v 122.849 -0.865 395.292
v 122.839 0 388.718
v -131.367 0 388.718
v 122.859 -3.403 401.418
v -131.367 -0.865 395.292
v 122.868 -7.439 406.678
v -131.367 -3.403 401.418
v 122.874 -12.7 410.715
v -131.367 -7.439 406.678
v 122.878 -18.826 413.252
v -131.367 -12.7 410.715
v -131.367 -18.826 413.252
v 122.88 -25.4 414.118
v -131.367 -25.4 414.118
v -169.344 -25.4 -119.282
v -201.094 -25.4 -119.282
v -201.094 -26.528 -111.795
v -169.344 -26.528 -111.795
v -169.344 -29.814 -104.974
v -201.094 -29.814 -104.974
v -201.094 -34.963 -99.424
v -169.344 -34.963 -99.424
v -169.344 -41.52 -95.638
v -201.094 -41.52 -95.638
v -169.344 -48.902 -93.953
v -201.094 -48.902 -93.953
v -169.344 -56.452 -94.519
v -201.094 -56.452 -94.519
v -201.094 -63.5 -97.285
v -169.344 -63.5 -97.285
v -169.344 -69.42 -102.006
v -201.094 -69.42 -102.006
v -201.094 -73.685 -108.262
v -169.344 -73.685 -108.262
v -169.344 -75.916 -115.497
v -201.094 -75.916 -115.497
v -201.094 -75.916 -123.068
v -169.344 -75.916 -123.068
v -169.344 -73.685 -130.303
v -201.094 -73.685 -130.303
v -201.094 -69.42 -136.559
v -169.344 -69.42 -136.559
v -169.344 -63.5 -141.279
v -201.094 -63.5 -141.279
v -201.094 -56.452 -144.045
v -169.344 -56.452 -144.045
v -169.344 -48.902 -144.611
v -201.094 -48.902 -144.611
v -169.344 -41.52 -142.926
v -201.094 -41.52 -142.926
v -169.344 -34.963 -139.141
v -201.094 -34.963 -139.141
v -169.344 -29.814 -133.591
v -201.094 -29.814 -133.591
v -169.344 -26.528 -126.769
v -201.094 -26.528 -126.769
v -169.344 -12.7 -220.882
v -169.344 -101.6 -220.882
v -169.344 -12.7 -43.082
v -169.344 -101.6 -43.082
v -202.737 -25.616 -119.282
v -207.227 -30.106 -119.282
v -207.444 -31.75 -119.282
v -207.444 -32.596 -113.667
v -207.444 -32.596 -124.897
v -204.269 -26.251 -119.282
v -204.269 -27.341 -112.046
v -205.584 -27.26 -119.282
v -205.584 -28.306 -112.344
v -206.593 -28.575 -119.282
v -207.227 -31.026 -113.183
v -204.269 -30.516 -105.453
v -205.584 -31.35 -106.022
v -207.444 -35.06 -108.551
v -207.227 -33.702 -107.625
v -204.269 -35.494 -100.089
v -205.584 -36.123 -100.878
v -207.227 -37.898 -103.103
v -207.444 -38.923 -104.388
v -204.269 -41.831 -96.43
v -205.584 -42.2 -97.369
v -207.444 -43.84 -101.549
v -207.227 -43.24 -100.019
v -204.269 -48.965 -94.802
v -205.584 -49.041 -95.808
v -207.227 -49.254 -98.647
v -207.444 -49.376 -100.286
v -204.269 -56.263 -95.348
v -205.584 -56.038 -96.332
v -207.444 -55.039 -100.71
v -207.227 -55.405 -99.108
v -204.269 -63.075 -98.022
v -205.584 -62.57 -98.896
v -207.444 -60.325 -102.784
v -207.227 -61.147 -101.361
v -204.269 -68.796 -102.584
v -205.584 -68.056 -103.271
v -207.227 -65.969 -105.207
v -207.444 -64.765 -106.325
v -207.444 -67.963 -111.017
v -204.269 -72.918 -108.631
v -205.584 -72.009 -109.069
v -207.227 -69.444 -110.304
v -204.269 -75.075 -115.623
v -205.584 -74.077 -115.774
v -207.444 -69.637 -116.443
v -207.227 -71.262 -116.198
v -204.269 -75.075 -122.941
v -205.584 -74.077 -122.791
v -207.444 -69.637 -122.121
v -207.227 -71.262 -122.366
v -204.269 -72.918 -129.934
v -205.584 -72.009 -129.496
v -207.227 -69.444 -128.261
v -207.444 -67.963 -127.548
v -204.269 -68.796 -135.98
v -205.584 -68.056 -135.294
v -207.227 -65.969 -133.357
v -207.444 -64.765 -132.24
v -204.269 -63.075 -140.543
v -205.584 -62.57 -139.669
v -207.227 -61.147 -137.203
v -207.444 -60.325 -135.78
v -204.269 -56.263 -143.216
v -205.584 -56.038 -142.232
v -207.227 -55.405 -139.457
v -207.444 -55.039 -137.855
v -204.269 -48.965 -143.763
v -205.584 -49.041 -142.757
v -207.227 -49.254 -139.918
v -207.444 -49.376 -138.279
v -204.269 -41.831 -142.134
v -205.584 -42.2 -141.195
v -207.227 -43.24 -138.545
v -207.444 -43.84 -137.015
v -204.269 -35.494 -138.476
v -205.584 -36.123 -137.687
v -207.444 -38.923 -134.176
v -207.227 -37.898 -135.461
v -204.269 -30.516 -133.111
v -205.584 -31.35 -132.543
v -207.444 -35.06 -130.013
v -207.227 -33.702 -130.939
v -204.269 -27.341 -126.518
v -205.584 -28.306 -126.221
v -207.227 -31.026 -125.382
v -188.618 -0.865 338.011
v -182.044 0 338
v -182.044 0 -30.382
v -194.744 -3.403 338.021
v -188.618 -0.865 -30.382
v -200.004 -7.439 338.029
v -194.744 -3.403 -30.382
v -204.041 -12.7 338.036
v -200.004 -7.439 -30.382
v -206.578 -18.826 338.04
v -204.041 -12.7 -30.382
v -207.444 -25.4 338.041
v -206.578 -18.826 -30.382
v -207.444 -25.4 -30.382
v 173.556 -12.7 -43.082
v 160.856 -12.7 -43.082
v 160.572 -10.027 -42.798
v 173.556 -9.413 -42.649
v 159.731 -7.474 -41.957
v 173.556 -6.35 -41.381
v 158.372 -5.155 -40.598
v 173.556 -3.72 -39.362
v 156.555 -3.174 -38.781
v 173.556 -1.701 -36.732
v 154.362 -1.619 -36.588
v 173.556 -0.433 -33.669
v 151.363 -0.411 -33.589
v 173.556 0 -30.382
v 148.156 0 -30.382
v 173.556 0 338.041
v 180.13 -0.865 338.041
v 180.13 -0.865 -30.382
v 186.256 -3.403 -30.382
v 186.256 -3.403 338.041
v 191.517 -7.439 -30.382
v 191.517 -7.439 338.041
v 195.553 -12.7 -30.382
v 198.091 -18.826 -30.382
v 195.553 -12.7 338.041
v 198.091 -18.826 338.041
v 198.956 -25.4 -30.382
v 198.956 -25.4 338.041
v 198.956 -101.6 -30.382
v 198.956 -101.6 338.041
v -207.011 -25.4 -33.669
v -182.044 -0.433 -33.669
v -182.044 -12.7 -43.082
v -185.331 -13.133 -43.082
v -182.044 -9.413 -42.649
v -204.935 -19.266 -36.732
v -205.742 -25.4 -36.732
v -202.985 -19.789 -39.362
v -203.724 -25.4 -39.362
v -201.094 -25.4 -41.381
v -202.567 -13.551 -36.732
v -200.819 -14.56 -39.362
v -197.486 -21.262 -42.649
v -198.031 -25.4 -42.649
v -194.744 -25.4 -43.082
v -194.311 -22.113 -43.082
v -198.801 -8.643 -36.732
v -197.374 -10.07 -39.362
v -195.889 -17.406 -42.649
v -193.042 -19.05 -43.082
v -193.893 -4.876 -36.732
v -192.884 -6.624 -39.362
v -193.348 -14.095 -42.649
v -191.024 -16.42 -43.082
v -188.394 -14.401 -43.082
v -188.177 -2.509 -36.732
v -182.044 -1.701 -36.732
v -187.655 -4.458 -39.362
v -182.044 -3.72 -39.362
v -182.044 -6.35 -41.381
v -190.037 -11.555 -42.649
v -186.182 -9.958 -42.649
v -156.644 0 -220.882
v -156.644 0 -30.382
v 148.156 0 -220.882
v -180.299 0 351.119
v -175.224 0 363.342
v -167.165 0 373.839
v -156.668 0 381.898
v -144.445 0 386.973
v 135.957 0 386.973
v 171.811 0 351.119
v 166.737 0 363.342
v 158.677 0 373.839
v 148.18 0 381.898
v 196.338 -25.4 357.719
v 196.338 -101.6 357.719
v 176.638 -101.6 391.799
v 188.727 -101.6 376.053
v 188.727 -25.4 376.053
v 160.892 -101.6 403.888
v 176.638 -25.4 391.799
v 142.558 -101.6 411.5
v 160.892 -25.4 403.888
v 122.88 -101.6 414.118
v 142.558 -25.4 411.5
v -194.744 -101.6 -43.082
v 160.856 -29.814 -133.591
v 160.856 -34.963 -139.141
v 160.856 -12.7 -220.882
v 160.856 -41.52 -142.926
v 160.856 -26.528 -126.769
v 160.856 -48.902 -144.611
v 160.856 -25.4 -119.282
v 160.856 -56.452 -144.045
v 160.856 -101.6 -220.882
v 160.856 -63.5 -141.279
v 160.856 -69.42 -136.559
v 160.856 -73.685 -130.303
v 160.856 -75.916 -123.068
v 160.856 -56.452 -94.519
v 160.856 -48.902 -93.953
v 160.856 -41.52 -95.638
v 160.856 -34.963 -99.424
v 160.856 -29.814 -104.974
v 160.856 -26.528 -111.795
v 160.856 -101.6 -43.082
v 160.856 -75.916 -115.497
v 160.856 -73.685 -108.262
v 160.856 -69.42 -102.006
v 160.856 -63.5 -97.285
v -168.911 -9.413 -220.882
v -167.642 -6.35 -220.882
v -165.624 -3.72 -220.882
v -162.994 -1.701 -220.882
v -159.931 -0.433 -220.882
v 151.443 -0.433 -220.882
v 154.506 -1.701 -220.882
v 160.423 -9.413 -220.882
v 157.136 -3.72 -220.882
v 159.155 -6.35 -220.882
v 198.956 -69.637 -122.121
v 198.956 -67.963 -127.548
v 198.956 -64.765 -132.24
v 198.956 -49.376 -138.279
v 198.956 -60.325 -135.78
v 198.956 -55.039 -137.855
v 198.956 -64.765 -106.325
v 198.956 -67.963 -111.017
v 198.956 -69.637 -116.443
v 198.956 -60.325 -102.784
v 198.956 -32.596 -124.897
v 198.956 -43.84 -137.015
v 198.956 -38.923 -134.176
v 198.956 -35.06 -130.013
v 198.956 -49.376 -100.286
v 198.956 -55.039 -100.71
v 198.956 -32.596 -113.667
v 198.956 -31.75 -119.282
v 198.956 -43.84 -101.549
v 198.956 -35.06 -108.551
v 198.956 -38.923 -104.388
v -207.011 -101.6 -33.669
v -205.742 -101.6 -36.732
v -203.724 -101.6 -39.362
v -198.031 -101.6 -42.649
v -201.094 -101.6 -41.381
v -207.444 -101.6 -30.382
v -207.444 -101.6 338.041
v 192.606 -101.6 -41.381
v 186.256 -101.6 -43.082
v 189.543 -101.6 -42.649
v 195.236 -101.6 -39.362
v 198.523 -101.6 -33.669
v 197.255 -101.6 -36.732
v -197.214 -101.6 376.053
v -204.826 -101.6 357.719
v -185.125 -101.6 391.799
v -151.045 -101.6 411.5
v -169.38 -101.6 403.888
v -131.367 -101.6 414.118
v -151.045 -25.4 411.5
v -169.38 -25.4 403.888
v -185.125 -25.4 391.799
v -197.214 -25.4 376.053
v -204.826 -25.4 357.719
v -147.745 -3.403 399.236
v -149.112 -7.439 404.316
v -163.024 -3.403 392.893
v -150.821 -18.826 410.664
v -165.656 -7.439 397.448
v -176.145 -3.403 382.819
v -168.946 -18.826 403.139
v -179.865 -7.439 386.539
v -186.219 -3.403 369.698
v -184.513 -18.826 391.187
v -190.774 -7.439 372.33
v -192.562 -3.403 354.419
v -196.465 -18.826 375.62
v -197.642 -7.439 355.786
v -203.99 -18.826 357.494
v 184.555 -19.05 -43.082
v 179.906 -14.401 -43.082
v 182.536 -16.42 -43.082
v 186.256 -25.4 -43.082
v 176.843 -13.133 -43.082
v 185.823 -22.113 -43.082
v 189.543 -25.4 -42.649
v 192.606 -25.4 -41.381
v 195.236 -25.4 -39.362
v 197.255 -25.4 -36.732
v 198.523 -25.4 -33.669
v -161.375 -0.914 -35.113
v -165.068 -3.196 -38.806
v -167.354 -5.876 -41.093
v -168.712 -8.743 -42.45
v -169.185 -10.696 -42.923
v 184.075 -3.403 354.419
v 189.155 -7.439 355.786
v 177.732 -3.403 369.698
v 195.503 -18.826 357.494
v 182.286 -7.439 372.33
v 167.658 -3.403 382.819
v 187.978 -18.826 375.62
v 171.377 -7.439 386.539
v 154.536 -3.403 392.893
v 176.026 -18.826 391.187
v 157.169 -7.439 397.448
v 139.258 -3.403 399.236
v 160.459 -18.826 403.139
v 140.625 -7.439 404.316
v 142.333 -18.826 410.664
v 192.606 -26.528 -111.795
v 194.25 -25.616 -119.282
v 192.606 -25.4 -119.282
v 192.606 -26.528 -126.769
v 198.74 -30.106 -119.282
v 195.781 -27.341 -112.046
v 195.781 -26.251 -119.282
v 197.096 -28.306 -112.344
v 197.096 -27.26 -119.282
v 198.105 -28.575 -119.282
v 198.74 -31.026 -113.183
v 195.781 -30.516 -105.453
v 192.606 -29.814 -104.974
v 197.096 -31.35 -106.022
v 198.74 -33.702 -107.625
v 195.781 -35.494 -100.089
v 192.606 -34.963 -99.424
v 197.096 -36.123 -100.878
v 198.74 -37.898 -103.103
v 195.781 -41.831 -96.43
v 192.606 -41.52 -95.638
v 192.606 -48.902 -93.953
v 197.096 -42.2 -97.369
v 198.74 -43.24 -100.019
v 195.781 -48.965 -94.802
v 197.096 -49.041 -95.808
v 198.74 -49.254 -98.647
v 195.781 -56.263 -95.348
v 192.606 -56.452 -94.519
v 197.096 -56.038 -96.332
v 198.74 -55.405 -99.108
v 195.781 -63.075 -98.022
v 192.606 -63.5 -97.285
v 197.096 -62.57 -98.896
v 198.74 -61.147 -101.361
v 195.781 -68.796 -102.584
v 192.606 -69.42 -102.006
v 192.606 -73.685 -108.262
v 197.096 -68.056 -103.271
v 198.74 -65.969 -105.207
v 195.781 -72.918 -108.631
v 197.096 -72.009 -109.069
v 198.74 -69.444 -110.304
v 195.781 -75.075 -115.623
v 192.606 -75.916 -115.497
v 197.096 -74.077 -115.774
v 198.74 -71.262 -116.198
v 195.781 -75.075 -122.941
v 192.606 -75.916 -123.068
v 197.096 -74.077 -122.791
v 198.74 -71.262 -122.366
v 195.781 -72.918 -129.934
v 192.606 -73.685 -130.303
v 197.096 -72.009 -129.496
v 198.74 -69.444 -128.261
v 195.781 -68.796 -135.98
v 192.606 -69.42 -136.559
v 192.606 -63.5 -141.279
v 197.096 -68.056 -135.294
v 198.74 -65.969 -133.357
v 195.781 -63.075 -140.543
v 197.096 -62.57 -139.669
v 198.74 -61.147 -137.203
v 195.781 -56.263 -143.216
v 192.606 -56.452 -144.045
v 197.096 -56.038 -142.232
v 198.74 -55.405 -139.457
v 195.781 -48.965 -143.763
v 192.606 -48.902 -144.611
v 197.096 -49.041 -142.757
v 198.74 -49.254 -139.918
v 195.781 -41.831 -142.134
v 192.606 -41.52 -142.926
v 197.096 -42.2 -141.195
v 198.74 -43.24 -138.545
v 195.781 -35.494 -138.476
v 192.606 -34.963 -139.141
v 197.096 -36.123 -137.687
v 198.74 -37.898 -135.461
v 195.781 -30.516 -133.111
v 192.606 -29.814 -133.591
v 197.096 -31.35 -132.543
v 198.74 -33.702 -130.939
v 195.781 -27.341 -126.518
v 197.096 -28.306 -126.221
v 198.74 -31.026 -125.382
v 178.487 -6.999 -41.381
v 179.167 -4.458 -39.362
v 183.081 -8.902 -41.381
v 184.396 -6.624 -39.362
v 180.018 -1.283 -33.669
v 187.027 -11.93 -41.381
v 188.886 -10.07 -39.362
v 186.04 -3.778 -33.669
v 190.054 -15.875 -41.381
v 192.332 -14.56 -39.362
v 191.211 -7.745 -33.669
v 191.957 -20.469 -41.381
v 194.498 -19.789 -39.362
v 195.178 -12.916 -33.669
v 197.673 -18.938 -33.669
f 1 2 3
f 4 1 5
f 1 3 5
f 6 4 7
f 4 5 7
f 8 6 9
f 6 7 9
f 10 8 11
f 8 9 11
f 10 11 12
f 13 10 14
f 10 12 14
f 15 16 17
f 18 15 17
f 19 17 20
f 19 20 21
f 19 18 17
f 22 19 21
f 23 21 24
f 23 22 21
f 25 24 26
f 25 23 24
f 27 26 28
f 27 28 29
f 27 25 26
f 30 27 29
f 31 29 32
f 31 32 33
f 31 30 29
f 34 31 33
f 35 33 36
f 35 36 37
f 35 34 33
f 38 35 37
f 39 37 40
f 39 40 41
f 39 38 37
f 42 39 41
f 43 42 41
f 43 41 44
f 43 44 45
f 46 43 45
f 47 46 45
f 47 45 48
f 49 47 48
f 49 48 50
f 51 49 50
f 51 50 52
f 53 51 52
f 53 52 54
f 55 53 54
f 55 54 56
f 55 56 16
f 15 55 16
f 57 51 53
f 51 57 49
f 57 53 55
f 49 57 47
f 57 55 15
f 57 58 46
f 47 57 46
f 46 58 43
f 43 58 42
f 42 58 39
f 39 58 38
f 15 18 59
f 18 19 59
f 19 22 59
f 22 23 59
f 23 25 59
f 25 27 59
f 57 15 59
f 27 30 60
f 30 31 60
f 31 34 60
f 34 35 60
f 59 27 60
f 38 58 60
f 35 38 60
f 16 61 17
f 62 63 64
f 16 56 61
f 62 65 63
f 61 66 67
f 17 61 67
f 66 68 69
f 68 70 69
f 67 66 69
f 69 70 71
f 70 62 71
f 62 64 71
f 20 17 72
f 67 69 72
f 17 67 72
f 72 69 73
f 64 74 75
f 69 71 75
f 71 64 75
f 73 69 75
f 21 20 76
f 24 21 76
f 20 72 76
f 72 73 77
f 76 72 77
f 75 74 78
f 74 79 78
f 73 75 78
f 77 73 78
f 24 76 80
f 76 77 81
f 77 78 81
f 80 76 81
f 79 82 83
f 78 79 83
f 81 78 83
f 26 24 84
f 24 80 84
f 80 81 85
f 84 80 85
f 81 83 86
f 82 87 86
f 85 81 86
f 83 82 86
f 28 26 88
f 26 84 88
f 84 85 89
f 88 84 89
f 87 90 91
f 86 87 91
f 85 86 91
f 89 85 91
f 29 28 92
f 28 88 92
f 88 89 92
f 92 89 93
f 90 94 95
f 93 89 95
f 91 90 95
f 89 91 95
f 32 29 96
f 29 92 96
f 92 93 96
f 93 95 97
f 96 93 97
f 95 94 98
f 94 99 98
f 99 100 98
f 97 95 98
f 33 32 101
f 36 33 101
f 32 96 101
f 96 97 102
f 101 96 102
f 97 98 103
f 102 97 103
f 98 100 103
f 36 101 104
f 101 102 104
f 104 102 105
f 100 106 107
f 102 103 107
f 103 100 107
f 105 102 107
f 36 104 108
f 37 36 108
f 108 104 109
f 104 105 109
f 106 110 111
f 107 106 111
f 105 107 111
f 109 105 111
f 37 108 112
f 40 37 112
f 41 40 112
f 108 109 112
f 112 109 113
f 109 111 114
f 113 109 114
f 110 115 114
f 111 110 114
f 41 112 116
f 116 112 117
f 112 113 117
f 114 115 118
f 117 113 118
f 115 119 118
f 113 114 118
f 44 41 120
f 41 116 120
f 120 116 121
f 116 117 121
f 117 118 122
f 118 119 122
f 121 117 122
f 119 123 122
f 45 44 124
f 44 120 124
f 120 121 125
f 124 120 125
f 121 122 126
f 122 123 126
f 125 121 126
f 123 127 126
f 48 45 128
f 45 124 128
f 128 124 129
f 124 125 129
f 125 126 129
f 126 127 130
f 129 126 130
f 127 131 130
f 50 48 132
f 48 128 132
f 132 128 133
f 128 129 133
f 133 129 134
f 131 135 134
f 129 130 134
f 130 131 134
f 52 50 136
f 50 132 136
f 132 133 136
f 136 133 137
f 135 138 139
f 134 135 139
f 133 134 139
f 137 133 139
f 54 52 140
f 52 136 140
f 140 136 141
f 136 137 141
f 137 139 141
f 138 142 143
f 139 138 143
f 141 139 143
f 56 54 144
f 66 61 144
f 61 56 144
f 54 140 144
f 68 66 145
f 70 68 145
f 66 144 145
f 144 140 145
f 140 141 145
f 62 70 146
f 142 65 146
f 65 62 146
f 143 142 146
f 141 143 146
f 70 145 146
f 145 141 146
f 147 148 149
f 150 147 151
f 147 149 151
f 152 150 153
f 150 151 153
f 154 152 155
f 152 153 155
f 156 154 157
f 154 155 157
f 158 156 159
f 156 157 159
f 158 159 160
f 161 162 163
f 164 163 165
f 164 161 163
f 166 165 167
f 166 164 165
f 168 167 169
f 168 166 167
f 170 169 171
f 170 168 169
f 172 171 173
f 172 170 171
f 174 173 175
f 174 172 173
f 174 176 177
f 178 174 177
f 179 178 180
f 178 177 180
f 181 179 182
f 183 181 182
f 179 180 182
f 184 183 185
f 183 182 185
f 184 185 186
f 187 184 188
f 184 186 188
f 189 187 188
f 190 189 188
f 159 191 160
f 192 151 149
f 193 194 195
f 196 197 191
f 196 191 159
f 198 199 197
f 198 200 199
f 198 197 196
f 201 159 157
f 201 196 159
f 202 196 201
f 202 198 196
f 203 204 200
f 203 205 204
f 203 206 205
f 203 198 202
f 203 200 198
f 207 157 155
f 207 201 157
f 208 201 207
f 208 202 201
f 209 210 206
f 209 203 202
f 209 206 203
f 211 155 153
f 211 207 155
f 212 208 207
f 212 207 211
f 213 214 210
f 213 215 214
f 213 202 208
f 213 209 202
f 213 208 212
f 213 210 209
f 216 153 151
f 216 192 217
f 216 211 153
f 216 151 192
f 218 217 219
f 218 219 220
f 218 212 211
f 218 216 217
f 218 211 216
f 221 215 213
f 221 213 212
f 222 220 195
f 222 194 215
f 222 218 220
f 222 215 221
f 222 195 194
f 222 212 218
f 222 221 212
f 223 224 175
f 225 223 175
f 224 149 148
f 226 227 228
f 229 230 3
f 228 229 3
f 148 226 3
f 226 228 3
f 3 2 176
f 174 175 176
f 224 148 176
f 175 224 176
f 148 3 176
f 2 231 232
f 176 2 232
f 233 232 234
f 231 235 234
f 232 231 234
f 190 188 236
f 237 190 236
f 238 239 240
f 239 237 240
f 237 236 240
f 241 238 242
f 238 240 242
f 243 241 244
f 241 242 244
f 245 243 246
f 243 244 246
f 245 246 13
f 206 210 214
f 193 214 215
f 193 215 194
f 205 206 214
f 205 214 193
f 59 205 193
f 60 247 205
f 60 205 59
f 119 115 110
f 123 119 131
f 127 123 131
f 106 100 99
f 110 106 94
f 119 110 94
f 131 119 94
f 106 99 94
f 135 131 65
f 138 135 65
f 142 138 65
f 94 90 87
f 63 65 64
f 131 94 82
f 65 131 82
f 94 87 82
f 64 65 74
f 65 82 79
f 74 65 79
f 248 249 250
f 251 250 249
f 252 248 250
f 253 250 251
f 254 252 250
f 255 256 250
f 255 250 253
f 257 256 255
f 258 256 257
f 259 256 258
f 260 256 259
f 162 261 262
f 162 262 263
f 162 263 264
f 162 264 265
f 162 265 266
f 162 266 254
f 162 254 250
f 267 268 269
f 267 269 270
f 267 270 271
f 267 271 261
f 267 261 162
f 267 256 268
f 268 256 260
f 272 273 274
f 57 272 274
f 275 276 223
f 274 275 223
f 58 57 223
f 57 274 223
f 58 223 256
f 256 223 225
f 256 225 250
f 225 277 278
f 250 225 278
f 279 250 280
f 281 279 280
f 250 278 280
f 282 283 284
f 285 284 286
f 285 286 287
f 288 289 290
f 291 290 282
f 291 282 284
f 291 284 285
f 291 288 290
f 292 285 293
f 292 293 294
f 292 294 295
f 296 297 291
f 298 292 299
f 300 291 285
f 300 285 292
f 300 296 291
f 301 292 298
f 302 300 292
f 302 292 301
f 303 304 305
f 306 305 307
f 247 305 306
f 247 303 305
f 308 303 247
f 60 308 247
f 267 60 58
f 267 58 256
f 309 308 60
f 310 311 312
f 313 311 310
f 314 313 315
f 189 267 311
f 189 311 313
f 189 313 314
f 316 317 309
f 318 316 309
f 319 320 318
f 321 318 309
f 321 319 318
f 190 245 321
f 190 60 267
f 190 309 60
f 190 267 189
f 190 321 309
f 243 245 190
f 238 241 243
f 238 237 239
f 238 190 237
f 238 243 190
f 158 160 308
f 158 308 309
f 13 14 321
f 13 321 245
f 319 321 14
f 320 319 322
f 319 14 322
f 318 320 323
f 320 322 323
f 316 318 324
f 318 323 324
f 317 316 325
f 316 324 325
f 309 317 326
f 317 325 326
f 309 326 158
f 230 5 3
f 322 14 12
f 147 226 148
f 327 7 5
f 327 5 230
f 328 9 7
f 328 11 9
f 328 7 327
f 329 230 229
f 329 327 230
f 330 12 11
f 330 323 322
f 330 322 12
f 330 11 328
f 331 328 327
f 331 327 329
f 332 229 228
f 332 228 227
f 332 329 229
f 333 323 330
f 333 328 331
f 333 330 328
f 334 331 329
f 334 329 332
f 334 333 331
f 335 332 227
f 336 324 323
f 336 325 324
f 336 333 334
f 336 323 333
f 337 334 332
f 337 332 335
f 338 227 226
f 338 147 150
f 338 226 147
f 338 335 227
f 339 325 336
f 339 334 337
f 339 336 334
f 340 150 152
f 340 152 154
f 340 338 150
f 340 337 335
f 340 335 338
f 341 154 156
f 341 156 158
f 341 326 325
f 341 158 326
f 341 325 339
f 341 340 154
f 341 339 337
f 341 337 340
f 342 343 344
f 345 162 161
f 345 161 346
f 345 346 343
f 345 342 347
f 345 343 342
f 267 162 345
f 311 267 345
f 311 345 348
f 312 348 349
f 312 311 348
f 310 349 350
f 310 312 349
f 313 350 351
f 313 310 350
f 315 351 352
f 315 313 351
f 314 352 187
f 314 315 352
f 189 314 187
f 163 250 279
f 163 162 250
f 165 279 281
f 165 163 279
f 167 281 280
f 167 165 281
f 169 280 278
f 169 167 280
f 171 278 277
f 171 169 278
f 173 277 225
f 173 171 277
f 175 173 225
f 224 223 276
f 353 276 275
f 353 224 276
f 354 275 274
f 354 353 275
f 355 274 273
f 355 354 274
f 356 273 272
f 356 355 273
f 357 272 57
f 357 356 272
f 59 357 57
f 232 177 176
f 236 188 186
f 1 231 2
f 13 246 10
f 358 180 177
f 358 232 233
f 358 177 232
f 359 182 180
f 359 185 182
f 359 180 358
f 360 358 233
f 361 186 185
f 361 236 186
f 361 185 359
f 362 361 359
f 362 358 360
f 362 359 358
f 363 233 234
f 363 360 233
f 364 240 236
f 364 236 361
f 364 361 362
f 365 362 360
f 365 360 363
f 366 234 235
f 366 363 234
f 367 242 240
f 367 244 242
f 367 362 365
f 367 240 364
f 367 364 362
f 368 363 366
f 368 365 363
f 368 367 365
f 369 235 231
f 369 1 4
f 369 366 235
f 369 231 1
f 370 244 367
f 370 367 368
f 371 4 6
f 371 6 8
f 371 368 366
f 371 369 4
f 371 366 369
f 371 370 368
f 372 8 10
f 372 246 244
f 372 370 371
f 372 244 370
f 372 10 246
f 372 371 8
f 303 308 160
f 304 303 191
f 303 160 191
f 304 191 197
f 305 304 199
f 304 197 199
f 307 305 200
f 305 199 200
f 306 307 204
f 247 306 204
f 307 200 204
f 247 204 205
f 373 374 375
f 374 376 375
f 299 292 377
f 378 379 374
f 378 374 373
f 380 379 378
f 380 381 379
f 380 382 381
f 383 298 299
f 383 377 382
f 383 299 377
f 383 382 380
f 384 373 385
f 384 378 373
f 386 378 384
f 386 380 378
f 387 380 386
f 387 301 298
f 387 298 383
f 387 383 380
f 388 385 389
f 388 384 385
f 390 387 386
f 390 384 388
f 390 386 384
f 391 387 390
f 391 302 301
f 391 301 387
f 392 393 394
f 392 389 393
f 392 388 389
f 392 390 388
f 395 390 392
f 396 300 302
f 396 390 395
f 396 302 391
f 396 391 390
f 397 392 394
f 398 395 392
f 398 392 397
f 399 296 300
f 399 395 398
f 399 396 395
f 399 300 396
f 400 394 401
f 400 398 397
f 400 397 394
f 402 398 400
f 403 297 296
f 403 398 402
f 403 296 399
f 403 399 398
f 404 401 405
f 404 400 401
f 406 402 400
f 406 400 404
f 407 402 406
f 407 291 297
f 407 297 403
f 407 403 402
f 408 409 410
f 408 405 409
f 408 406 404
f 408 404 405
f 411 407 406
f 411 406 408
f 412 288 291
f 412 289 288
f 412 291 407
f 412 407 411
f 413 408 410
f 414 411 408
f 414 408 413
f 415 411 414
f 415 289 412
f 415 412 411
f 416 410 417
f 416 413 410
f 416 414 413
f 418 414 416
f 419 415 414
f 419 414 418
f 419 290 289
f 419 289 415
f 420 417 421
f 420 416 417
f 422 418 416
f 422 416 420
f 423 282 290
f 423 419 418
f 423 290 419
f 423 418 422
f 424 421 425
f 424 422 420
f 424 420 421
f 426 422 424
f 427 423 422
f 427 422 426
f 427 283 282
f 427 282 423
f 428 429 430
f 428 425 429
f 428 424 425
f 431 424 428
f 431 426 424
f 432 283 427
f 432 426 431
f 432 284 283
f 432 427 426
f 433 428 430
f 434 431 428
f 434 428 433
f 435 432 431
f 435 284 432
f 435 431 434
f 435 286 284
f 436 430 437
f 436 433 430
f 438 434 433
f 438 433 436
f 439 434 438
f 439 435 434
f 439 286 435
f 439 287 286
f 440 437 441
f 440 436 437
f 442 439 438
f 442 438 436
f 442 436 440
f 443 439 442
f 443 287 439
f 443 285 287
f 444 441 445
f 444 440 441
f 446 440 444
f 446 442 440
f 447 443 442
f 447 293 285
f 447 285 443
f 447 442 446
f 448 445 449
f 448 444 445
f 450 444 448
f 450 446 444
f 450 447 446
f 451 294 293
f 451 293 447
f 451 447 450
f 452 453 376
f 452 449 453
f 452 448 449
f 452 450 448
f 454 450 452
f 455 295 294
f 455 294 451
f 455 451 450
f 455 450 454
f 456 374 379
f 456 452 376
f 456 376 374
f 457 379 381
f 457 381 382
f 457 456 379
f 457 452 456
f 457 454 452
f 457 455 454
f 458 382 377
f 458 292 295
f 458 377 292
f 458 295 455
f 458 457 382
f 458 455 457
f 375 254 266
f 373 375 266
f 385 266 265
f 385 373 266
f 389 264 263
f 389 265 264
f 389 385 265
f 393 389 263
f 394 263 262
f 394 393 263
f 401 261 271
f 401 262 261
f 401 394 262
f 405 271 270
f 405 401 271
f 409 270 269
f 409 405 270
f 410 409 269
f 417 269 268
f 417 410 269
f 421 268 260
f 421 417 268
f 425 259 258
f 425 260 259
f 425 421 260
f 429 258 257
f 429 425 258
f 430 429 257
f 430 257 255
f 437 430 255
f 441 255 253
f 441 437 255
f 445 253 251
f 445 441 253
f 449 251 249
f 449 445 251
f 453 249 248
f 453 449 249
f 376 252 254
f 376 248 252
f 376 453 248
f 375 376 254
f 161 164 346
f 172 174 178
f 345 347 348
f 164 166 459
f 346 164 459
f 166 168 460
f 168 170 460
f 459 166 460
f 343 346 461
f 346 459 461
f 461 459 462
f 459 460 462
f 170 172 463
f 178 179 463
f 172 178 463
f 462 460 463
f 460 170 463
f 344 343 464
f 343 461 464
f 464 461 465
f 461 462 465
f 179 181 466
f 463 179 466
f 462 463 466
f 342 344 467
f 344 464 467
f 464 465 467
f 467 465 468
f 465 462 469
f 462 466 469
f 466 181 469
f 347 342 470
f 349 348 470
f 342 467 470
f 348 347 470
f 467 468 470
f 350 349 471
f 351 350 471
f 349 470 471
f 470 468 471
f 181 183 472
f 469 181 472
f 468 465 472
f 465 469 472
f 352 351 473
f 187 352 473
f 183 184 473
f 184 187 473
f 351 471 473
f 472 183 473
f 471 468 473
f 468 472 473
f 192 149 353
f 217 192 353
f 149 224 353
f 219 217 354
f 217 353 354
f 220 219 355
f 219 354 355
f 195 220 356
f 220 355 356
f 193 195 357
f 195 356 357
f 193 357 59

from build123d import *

# Parameters (mm, degrees)
F0_W        = 406.4
F0_H        = 635
F1_DEPTH    = 101.6
F2_W        = 129.6282266226
F2_H        = 559.1529050058
F2_W_2      = 230.7462543249
F2_H_2      = 486.9312153578
F3_DEPTH    = 127
F4_T1_DEPTH = 482.5995000003
F5_R        = 25.4
F6_R        = 25.4
F7_DEPTH    = 406.4
F8_R        = 6.35
F9_R        = 12.7
F10_DEPTH   = 25.4


# Not quite as in the source:
# - a fillet or chamfer that OpenCascade refuses, or shapes differently, is made with other operations: its cross-section is extruded or revolved along the edge and cut away or added
# - a feature names something its author has since deleted; it is built from what else it names


with BuildPart() as f1:
    # F0 (on Front) → F1 (new body)
    with BuildSketch(Plane.XZ):
        with Locations((-4.243819043, 96.6177646602)):
            Rectangle(F0_W, F0_H)
    extrude(amount=F1_DEPTH)

    # F2 (on face) → F3 (cut)
    with BuildSketch(Plane.XZ.offset(101.6)):
        with Locations((-234.1579323543, -322.6586878427)):
            Rectangle(F2_W, F2_H)
        with Locations((276.2293081194, -286.5478430187)):
            Rectangle(F2_W_2, F2_H_2)
    extrude(amount=-F3_DEPTH, mode=Mode.SUBTRACT)

    # F4: fillet of radius 76.2 on 2 edges, made by hand

    # F4_s2 → F4_t1 (cut)
    with BuildSketch(Plane.XZ.offset(-190.4997500002)):
        with BuildLine():
            ThreePointArc((198.956280957, 337.9178646602), (176.6378176834, 391.7994013866), (122.756280957, 414.1178646602))
            Line((122.756280957, 414.1178646602), (122.756280957, 415.6418646602))
            Line((122.756280957, 415.6418646602), (200.480180957, 415.6417646602))
            Line((200.480180957, 415.6417646602), (200.480280957, 337.9178646602))
            Line((200.480280957, 337.9178646602), (198.956280957, 337.9178646602))
        make_face()
        with BuildLine():
            ThreePointArc((-131.243919043, 414.1178646602), (-185.1254557695, 391.7994013866), (-207.443919043, 337.9178646602))
            Line((-207.443919043, 337.9178646602), (-208.967919043, 337.9178646602))
            Line((-208.967919043, 337.9178646602), (-208.967819043, 415.6417646602))
            Line((-208.967819043, 415.6417646602), (-131.243919043, 415.6418646602))
            Line((-131.243919043, 415.6418646602), (-131.243919043, 414.1178646602))
        make_face()
    extrude(amount=F4_T1_DEPTH, mode=Mode.SUBTRACT)

    # F5
    f5_edges = [f1.edges().sort_by_distance(p)[0] for p in [
        (198.956181, 0, 147.47954),
        (176.637818, 0, 391.799401),
        (-4.243819, 0, 414.117765),
        (-185.125456, 0, 391.799401),
        (-207.443819, 0, 147.47954),
    ]]
    fillet(f5_edges, radius=F5_R)

    # F6 (on face) → F7 (join)
    with BuildSketch(Plane.YZ.offset(198.956180957)):
        with Locations((-50.8, -119.2822353398)):
            Circle(F6_R)
    extrude(amount=-F7_DEPTH)

    # F8
    f8_edges = [f1.edges().sort_by_distance(p)[0] for p in [
        (-207.443819, -76.2, -119.282235),
        (198.956181, -76.2, -119.282235),
    ]]
    fillet(f8_edges, radius=F8_R)

    # F9
    f9_edges = [f1.edges().sort_by_distance(p)[0] for p in [
        (-169.343819, 0, -131.982235),
        (-175.693819, 0, -43.082235),
        (-200.004331, -7.439488, -43.082235),
        (-207.443819, -63.5, -43.082235),
        (160.856181, 0, -131.982235),
        (167.206181, 0, -43.082235),
        (191.516693, -7.439488, -43.082235),
        (198.956181, -63.5, -43.082235),
    ]]
    fillet(f9_edges, radius=F9_R)

    # F2 (on face) → F10 (cut)
    with BuildSketch(Plane.XZ.offset(101.6)):
        with Locations((-234.1579323543, -322.6586878427)):
            Rectangle(F2_W, F2_H)
        with Locations((276.2293081194, -286.5478430187)):
            Rectangle(F2_W_2, F2_H_2)
    extrude(amount=-F10_DEPTH, mode=Mode.SUBTRACT)


solid = f1.part
